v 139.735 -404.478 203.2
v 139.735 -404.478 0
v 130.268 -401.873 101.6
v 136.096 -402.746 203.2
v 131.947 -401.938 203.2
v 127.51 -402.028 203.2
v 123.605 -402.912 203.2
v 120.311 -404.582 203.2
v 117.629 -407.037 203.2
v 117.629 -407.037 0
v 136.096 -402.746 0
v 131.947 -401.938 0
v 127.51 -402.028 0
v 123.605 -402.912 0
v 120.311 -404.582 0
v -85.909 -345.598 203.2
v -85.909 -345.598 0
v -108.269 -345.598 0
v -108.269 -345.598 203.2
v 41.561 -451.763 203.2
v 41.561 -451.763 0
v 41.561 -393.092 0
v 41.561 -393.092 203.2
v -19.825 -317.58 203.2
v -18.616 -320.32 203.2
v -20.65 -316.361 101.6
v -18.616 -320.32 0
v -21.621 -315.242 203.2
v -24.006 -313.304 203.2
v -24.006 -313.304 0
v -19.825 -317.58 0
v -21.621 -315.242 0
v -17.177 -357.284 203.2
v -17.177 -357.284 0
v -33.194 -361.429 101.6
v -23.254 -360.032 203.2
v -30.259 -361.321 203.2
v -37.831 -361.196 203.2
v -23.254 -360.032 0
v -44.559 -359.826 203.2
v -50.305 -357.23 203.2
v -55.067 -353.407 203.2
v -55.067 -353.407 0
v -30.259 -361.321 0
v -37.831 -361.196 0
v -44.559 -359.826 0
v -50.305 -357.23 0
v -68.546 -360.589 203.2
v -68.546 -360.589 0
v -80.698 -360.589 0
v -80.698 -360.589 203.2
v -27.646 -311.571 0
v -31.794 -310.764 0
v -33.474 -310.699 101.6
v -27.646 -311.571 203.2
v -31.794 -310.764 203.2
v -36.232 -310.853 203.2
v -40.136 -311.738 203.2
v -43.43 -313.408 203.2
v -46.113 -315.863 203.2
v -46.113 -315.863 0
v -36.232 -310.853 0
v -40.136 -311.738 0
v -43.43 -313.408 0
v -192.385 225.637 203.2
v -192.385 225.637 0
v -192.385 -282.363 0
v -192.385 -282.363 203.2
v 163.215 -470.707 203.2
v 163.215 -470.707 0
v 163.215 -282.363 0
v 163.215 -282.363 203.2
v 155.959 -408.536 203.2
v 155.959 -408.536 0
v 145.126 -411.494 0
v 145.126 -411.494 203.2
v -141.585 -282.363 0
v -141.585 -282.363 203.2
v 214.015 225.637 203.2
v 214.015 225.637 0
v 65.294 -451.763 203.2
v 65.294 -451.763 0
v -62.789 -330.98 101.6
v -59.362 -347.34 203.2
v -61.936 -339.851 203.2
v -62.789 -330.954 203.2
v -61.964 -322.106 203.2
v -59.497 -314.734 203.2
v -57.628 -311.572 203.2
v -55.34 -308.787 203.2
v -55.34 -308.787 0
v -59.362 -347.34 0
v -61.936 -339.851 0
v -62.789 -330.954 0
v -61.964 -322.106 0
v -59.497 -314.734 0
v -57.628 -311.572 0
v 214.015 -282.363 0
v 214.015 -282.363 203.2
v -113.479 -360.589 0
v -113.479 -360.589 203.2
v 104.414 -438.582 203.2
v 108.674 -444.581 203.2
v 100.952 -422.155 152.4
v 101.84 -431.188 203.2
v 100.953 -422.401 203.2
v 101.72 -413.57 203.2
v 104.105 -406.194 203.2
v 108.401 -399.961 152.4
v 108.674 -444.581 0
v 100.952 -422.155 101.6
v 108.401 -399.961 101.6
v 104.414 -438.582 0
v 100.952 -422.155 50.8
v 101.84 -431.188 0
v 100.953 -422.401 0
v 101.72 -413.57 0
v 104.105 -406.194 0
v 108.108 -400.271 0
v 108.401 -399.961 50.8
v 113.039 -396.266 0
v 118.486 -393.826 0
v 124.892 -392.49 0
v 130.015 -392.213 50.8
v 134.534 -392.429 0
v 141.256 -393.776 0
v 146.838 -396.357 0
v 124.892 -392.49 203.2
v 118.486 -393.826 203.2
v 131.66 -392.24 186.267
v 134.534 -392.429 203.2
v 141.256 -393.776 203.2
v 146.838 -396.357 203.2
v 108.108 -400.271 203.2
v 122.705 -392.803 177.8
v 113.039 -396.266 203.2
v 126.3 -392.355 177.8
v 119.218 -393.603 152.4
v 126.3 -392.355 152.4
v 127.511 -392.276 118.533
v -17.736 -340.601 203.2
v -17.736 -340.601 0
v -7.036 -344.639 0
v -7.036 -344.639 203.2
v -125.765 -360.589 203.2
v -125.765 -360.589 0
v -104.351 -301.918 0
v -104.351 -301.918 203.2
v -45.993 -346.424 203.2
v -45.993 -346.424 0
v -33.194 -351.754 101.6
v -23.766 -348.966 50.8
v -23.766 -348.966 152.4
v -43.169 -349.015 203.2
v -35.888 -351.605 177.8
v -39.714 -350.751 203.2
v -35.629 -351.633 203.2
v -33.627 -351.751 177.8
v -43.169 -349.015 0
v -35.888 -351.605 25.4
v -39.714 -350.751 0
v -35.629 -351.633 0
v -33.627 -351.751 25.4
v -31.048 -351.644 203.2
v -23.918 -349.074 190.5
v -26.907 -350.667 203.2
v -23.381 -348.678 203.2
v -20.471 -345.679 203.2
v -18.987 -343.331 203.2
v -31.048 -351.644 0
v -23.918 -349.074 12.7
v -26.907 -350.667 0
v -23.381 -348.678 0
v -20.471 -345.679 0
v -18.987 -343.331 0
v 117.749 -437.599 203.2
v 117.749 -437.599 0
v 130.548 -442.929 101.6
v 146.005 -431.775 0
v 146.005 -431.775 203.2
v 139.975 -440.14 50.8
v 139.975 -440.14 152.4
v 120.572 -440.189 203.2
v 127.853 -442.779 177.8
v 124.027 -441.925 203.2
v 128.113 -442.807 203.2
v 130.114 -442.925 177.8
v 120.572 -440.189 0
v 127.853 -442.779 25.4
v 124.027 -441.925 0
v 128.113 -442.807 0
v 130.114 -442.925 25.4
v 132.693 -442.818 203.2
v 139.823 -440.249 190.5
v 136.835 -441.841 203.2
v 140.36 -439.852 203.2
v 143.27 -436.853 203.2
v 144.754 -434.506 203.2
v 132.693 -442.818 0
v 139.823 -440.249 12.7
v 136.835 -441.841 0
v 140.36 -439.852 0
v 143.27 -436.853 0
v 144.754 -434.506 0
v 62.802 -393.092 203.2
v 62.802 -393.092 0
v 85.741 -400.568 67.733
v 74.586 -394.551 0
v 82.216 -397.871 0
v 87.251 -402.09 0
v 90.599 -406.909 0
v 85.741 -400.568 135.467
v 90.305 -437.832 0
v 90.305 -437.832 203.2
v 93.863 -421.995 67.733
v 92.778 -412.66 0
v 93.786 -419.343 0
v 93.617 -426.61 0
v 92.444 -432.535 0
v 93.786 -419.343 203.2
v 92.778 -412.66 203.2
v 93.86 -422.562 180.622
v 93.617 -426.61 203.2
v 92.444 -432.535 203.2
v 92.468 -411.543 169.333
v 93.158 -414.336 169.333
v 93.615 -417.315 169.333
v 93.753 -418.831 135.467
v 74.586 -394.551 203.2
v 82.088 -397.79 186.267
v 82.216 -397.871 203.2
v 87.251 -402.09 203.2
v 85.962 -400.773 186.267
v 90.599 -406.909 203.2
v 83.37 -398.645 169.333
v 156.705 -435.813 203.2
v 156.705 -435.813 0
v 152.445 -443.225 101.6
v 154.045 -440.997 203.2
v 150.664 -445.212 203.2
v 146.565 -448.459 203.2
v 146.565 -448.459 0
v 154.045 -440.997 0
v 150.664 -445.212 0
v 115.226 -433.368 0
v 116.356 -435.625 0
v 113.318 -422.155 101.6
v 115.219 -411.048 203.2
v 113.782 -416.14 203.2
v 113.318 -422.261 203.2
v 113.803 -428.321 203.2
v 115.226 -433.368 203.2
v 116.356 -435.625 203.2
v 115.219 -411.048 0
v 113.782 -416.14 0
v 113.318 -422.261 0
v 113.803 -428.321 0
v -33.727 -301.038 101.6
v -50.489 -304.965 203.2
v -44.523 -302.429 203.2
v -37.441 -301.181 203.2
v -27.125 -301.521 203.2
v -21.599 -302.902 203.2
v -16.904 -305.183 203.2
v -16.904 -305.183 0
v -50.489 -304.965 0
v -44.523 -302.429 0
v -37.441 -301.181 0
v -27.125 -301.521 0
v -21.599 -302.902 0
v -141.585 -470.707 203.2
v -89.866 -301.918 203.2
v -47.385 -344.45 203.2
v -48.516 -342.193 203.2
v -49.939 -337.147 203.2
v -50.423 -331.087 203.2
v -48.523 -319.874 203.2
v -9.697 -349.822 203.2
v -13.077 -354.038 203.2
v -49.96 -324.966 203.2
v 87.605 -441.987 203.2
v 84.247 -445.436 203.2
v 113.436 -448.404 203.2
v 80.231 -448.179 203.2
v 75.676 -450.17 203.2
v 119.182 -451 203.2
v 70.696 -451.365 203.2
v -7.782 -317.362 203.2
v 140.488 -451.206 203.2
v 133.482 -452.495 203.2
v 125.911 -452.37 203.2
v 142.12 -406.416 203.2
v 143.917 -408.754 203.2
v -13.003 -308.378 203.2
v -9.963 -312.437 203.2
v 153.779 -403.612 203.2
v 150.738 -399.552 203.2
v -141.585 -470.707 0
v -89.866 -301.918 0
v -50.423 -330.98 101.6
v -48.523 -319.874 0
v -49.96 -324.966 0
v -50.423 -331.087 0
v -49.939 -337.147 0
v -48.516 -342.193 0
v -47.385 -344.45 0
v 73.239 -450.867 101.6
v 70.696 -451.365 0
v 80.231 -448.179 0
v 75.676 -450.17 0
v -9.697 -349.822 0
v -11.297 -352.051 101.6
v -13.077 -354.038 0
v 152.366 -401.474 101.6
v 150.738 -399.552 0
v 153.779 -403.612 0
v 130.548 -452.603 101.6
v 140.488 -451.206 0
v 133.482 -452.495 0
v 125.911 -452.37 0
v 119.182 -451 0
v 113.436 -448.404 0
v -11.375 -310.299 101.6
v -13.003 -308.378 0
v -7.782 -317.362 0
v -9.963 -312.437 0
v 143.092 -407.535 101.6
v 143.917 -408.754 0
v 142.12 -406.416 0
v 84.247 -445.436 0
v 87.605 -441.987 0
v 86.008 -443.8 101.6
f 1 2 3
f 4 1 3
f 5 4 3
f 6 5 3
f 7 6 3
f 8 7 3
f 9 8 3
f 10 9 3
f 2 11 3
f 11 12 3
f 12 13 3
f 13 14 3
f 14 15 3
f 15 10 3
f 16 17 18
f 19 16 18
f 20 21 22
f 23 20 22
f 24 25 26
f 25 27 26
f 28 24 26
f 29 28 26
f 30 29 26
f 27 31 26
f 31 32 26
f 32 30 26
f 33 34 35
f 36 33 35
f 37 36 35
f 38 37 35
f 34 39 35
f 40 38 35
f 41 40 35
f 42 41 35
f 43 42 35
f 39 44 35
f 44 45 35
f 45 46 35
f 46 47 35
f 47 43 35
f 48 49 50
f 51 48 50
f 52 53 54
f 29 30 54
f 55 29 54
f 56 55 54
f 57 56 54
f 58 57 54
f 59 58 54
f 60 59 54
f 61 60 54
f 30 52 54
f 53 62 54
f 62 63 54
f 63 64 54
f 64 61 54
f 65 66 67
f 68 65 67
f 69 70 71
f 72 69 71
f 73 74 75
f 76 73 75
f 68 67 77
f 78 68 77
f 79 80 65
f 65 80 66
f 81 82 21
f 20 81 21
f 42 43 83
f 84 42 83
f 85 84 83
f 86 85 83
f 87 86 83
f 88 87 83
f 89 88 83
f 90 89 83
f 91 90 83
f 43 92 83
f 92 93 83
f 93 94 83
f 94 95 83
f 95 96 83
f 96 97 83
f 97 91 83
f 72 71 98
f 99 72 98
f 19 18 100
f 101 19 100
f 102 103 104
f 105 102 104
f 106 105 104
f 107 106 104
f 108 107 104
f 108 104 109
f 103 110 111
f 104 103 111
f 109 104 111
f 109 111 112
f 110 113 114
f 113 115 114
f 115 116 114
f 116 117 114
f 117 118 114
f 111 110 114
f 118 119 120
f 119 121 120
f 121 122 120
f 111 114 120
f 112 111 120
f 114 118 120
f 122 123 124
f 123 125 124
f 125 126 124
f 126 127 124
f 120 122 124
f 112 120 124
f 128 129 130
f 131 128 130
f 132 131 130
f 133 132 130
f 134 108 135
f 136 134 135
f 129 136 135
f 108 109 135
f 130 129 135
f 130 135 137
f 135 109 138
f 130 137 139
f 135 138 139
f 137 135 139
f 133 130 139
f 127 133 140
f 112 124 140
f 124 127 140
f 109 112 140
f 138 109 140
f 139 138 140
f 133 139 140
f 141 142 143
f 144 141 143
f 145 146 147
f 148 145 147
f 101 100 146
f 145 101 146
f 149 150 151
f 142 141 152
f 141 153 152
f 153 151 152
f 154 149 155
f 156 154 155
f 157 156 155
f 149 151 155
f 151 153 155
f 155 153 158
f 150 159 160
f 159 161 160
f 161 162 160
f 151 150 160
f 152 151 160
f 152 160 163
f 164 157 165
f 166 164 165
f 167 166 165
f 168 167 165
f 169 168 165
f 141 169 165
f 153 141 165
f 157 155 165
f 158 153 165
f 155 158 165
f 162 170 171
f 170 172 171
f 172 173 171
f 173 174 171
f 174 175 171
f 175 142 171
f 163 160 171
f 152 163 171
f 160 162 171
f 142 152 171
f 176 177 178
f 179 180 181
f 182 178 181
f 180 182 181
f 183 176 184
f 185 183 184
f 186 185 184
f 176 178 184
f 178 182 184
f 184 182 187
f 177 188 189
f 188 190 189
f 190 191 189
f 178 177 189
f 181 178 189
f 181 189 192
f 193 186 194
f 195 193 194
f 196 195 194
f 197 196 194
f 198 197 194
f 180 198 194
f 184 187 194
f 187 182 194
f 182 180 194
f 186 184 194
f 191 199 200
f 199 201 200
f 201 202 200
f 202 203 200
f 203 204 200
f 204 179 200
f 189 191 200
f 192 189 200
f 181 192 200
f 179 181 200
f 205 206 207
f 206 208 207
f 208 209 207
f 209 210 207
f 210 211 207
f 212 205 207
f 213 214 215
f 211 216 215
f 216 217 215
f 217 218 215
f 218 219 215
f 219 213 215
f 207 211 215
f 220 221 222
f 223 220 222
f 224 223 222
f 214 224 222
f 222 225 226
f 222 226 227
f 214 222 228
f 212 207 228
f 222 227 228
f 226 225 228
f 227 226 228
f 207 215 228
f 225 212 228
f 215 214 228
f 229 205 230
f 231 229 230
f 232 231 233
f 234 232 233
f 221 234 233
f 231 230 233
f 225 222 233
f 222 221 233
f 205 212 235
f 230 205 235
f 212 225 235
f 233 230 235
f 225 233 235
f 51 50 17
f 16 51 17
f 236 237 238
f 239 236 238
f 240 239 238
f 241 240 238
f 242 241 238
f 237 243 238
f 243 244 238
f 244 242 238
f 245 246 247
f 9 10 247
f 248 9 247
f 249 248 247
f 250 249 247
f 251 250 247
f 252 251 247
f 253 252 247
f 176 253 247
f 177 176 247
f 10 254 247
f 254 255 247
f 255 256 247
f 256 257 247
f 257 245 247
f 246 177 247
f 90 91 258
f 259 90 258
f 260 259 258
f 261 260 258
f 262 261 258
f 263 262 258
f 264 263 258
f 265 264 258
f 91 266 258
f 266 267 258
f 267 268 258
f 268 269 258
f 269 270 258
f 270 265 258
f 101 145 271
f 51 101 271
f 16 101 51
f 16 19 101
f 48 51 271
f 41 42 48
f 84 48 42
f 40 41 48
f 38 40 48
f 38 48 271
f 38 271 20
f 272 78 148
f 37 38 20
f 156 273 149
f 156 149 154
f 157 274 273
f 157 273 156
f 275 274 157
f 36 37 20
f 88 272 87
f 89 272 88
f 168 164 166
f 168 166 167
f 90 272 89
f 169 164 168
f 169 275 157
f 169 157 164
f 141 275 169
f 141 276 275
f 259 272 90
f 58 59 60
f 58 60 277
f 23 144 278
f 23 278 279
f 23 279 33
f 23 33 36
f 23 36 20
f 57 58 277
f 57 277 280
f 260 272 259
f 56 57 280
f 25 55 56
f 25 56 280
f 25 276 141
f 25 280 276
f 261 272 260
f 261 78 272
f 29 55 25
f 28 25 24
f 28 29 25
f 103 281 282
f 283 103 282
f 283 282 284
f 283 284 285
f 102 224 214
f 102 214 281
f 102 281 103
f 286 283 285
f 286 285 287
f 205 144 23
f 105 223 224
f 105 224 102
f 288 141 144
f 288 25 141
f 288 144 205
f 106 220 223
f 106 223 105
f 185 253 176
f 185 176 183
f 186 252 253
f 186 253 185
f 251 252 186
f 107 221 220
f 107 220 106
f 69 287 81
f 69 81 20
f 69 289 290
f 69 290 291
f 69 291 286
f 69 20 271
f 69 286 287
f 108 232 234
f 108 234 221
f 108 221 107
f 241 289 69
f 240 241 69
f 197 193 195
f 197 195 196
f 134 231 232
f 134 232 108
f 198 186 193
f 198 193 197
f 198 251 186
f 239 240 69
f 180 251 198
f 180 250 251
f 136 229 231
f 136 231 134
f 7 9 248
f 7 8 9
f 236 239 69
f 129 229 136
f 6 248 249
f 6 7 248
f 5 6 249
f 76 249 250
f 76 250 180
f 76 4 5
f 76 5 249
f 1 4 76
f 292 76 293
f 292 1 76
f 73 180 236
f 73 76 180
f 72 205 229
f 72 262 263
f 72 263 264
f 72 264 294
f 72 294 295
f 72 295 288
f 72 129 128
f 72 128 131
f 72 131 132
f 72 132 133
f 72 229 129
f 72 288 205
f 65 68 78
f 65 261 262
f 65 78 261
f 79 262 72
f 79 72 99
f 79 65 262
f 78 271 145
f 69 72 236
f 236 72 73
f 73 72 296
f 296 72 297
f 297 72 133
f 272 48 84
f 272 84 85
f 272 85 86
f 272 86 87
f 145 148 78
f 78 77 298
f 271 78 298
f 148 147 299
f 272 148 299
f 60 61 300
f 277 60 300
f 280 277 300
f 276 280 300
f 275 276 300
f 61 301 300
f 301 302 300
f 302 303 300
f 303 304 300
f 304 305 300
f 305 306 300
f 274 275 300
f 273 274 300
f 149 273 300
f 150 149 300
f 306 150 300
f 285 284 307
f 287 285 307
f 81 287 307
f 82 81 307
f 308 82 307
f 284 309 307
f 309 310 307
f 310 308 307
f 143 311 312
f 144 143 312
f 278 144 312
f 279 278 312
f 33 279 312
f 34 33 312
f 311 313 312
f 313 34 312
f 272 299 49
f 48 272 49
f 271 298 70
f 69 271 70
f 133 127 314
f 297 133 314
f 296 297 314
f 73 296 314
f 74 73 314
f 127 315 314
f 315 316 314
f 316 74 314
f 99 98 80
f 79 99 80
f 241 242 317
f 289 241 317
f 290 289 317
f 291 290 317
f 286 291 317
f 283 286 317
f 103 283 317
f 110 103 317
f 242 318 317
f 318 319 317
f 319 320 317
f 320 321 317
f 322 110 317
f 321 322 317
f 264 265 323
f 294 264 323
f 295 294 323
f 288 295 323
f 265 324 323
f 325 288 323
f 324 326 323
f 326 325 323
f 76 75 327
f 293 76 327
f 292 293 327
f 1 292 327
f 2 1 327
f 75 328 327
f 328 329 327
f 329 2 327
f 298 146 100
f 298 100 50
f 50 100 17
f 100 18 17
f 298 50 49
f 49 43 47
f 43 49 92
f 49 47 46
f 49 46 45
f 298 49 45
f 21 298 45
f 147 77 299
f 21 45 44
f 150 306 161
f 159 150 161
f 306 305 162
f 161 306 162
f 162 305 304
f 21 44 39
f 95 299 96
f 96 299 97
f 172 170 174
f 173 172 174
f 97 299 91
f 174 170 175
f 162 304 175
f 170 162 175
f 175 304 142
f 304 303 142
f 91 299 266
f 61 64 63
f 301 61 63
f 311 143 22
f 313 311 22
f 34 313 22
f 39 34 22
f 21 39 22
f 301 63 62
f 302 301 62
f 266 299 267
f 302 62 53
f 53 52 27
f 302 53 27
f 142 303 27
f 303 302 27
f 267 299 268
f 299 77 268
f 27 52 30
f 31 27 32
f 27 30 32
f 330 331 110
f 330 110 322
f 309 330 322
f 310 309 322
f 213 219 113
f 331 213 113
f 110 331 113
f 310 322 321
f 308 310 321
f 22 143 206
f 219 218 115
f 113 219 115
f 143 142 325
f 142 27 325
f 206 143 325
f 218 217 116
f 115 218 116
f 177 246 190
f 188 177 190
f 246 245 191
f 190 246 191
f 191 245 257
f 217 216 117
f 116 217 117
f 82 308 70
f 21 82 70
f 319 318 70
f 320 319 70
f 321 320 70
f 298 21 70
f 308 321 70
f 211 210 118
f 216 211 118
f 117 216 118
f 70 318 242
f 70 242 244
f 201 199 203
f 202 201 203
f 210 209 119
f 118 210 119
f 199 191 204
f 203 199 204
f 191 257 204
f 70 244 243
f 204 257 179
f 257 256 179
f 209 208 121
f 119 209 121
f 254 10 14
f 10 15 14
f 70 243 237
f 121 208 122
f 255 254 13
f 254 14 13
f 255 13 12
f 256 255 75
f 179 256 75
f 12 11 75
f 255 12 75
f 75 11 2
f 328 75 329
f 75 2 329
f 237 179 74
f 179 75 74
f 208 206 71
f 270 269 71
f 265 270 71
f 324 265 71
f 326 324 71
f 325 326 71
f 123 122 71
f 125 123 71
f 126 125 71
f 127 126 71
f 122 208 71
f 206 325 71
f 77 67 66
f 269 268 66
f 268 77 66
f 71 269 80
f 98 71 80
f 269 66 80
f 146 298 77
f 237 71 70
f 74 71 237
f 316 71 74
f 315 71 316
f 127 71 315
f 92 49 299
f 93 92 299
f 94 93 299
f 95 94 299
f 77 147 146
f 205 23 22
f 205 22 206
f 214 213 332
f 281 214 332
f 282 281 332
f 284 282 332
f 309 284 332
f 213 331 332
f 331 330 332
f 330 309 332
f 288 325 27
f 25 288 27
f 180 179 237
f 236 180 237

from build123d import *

# Parameters (mm, degrees)
F1_DEPTH = 203.2


with BuildPart() as f1:
    # F0 (on Top) → F1 (new body)
    with BuildSketch(Plane.XY):
        Polygon((214.0153056353, 225.6372907119), (-192.3846943647, 225.6372907119), (-192.3846943647, -282.3627092881), (-141.5846943647, -282.3627092881), (163.2153056353, -282.3627092881), (214.0153056353, -282.3627092881), align=None)
        Polygon((163.2153056353, -282.3627092881), (-141.5846943647, -282.3627092881), (-141.5846943647, -470.7070589066), align=None)
        Polygon((-68.5457757791, -360.5891466141), (-80.6984541123, -360.5891466141), (-85.9086484415, -345.5981782754), (-108.2685105503, -345.5981782754), (-113.4787048795, -360.5891466141), (-125.7646362646, -360.5891466141), (-104.3508708244, -301.9178278628), (-89.866264083, -301.9178278628), align=None, mode=Mode.SUBTRACT)
        with BuildLine():
            add(Edge.make_bspline(
                [(-45.9926967451, -346.4243471972), (-41.5620327694, -351.7544692731), (-33.1937411102, -351.7544692731)],
                knots=[0, 0, 0, 1, 1, 1], degree=2))
            add(Edge.make_bspline(
                [(-33.1937411102, -351.7544692731), (-22.0671112766, -351.7544692731), (-17.7363870898, -340.6011888292)],
                knots=[0, 0, 0, 1, 1, 1], degree=2))
            Line((-17.7363870898, -340.6011888292), (-7.0361670223, -344.6387563017))
            add(Edge.make_bspline(
                [(-7.0361670223, -344.6387563017), (-10.4874210665, -353.1403010129), (-17.1767242718, -357.284470927)],
                knots=[0, 0, 0, 1, 1, 1], degree=2))
            add(Edge.make_bspline(
                [(-17.1767242718, -357.284470927), (-23.8660274772, -361.428640841), (-33.1937411102, -361.428640841)],
                knots=[0, 0, 0, 1, 1, 1], degree=2))
            add(Edge.make_bspline(
                [(-33.1937411102, -361.428640841), (-47.3452152219, -361.428640841), (-55.0672295794, -353.4068071167)],
                knots=[0, 0, 0, 1, 1, 1], degree=2))
            add(Edge.make_bspline(
                [(-55.0672295794, -353.4068071167), (-62.789243937, -345.3849733924), (-62.789243937, -330.980318482)],
                knots=[0, 0, 0, 1, 1, 1], degree=2))
            add(Edge.make_bspline(
                [(-62.789243937, -330.980318482), (-62.789243937, -316.5356876561), (-55.3403983358, -308.7870226882)],
                knots=[0, 0, 0, 1, 1, 1], degree=2))
            add(Edge.make_bspline(
                [(-55.3403983358, -308.7870226882), (-47.8915527347, -301.0383577202), (-33.7267533178, -301.0383577202)],
                knots=[0, 0, 0, 1, 1, 1], degree=2))
            add(Edge.make_bspline(
                [(-33.7267533178, -301.0383577202), (-23.3996417955, -301.0383577202), (-16.9035555155, -305.1825276343)],
                knots=[0, 0, 0, 1, 1, 1], degree=2))
            add(Edge.make_bspline(
                [(-16.9035555155, -305.1825276343), (-10.4074692354, -309.3266975484), (-7.7823841129, -317.3618565779)],
                knots=[0, 0, 0, 1, 1, 1], degree=2))
            Line((-7.7823841129, -317.3618565779), (-18.6158572324, -320.3200743301))
            add(Edge.make_bspline(
                [(-18.6158572324, -320.3200743301), (-19.9883636669, -315.9093983122), (-24.0059431817, -313.3043011476)],
                knots=[0, 0, 0, 1, 1, 1], degree=2))
            add(Edge.make_bspline(
                [(-24.0059431817, -313.3043011476), (-28.0235226965, -310.6992039829), (-33.4735725191, -310.6992039829)],
                knots=[0, 0, 0, 1, 1, 1], degree=2))
            add(Edge.make_bspline(
                [(-33.4735725191, -310.6992039829), (-41.8018882629, -310.6992039829), (-46.1126244918, -315.862759744)],
                knots=[0, 0, 0, 1, 1, 1], degree=2))
            add(Edge.make_bspline(
                [(-46.1126244918, -315.862759744), (-50.4233607207, -321.0263155052), (-50.4233607207, -330.980318482)],
                knots=[0, 0, 0, 1, 1, 1], degree=2))
            add(Edge.make_bspline(
                [(-50.4233607207, -330.980318482), (-50.4233607207, -341.0942251212), (-45.9926967451, -346.4243471972)],
                knots=[0, 0, 0, 1, 1, 1], degree=2))
        make_face(mode=Mode.SUBTRACT)
        Polygon((163.2153056353, -470.7070589066), (163.2153056353, -282.3627092881), (-141.5846943647, -470.7070589066), align=None)
        with BuildLine():
            add(Edge.make_bspline(
                [(85.7413243761, -400.5675143045), (93.8631018313, -408.0430141443), (93.8631018313, -421.9946154497)],
                knots=[0, 0, 0, 1, 1, 1], degree=2))
            add(Edge.make_bspline(
                [(93.8631018313, -421.9946154497), (93.8631018313, -431.0691526884), (90.3052436188, -437.8317483546)],
                knots=[0, 0, 0, 1, 1, 1], degree=2))
            add(Edge.make_bspline(
                [(90.3052436188, -437.8317483546), (86.7473854062, -444.5943440207), (80.2313080058, -448.1788528566)],
                knots=[0, 0, 0, 1, 1, 1], degree=2))
            add(Edge.make_bspline(
                [(80.2313080058, -448.1788528566), (73.7152306053, -451.7633616924), (65.2936336377, -451.7633616924)],
                knots=[0, 0, 0, 1, 1, 1], degree=2))
            Line((65.2936336377, -451.7633616924), (41.5612535758, -451.7633616924))
            Line((41.5612535758, -451.7633616924), (41.5612535758, -393.0920144647))
            Line((41.5612535758, -393.0920144647), (62.8018003578, -393.0920144647))
            add(Edge.make_bspline(
                [(62.8018003578, -393.0920144647), (77.6195469209, -393.0920144647), (85.7413243761, -400.5675143045)],
                knots=[0, 0, 0, 1, 1, 1], degree=2))
        make_face(mode=Mode.SUBTRACT)
        with BuildLine():
            add(Edge.make_bspline(
                [(117.7487229773, -437.5985554006), (122.1793891034, -442.9286800635), (130.5476848243, -442.9286800635)],
                knots=[0, 0, 0, 1, 1, 1], degree=2))
            add(Edge.make_bspline(
                [(130.5476848243, -442.9286800635), (141.6743200583, -442.9286800635), (146.0050463469, -431.7753942062)],
                knots=[0, 0, 0, 1, 1, 1], degree=2))
            Line((146.0050463469, -431.7753942062), (156.7052716079, -435.8129636385))
            add(Edge.make_bspline(
                [(156.7052716079, -435.8129636385), (153.2540158886, -444.3145124759), (146.5647094366, -448.4586844014)],
                knots=[0, 0, 0, 1, 1, 1], degree=2))
            add(Edge.make_bspline(
                [(146.5647094366, -448.4586844014), (139.8754029845, -452.6028563268), (130.5476848243, -452.6028563268)],
                knots=[0, 0, 0, 1, 1, 1], degree=2))
            add(Edge.make_bspline(
                [(130.5476848243, -452.6028563268), (116.3962038441, -452.6028563268), (108.6741857386, -444.5810187091)],
                knots=[0, 0, 0, 1, 1, 1], degree=2))
            add(Edge.make_bspline(
                [(108.6741857386, -444.5810187091), (100.9521676331, -436.5591810913), (100.9521676331, -422.1545191896)],
                knots=[0, 0, 0, 1, 1, 1], degree=2))
            add(Edge.make_bspline(
                [(100.9521676331, -422.1545191896), (100.9521676331, -407.7098813529), (108.4010168496, -399.9612126241)],
                knots=[0, 0, 0, 1, 1, 1], degree=2))
            add(Edge.make_bspline(
                [(108.4010168496, -399.9612126241), (115.8498660661, -392.2125438953), (130.014672358, -392.2125438953)],
                knots=[0, 0, 0, 1, 1, 1], degree=2))
            add(Edge.make_bspline(
                [(130.014672358, -392.2125438953), (140.3417888925, -392.2125438953), (146.8378783255, -396.3567158207)],
                knots=[0, 0, 0, 1, 1, 1], degree=2))
            add(Edge.make_bspline(
                [(146.8378783255, -396.3567158207), (153.3339677585, -400.5008877462), (155.9590541551, -408.5360506756)],
                knots=[0, 0, 0, 1, 1, 1], degree=2))
            Line((155.9590541551, -408.5360506756), (145.1255757776, -411.4942698636))
            add(Edge.make_bspline(
                [(145.1255757776, -411.4942698636), (143.7530686768, -407.083591705), (139.7354872121, -404.4784932759)],
                knots=[0, 0, 0, 1, 1, 1], degree=2))
            add(Edge.make_bspline(
                [(139.7354872121, -404.4784932759), (135.7179057474, -401.8733948469), (130.2678532795, -401.8733948469)],
                knots=[0, 0, 0, 1, 1, 1], degree=2))
            add(Edge.make_bspline(
                [(130.2678532795, -401.8733948469), (121.9395334936, -401.8733948469), (117.6287951724, -407.0369531142)],
                knots=[0, 0, 0, 1, 1, 1], degree=2))
            add(Edge.make_bspline(
                [(117.6287951724, -407.0369531142), (113.3180568512, -412.2005113814), (113.3180568512, -422.1545191896)],
                knots=[0, 0, 0, 1, 1, 1], degree=2))
            add(Edge.make_bspline(
                [(113.3180568512, -422.1545191896), (113.3180568512, -432.2684307376), (117.7487229773, -437.5985554006)],
                knots=[0, 0, 0, 1, 1, 1], degree=2))
        make_face(mode=Mode.SUBTRACT)
    extrude(amount=F1_DEPTH)


solid = f1.part
